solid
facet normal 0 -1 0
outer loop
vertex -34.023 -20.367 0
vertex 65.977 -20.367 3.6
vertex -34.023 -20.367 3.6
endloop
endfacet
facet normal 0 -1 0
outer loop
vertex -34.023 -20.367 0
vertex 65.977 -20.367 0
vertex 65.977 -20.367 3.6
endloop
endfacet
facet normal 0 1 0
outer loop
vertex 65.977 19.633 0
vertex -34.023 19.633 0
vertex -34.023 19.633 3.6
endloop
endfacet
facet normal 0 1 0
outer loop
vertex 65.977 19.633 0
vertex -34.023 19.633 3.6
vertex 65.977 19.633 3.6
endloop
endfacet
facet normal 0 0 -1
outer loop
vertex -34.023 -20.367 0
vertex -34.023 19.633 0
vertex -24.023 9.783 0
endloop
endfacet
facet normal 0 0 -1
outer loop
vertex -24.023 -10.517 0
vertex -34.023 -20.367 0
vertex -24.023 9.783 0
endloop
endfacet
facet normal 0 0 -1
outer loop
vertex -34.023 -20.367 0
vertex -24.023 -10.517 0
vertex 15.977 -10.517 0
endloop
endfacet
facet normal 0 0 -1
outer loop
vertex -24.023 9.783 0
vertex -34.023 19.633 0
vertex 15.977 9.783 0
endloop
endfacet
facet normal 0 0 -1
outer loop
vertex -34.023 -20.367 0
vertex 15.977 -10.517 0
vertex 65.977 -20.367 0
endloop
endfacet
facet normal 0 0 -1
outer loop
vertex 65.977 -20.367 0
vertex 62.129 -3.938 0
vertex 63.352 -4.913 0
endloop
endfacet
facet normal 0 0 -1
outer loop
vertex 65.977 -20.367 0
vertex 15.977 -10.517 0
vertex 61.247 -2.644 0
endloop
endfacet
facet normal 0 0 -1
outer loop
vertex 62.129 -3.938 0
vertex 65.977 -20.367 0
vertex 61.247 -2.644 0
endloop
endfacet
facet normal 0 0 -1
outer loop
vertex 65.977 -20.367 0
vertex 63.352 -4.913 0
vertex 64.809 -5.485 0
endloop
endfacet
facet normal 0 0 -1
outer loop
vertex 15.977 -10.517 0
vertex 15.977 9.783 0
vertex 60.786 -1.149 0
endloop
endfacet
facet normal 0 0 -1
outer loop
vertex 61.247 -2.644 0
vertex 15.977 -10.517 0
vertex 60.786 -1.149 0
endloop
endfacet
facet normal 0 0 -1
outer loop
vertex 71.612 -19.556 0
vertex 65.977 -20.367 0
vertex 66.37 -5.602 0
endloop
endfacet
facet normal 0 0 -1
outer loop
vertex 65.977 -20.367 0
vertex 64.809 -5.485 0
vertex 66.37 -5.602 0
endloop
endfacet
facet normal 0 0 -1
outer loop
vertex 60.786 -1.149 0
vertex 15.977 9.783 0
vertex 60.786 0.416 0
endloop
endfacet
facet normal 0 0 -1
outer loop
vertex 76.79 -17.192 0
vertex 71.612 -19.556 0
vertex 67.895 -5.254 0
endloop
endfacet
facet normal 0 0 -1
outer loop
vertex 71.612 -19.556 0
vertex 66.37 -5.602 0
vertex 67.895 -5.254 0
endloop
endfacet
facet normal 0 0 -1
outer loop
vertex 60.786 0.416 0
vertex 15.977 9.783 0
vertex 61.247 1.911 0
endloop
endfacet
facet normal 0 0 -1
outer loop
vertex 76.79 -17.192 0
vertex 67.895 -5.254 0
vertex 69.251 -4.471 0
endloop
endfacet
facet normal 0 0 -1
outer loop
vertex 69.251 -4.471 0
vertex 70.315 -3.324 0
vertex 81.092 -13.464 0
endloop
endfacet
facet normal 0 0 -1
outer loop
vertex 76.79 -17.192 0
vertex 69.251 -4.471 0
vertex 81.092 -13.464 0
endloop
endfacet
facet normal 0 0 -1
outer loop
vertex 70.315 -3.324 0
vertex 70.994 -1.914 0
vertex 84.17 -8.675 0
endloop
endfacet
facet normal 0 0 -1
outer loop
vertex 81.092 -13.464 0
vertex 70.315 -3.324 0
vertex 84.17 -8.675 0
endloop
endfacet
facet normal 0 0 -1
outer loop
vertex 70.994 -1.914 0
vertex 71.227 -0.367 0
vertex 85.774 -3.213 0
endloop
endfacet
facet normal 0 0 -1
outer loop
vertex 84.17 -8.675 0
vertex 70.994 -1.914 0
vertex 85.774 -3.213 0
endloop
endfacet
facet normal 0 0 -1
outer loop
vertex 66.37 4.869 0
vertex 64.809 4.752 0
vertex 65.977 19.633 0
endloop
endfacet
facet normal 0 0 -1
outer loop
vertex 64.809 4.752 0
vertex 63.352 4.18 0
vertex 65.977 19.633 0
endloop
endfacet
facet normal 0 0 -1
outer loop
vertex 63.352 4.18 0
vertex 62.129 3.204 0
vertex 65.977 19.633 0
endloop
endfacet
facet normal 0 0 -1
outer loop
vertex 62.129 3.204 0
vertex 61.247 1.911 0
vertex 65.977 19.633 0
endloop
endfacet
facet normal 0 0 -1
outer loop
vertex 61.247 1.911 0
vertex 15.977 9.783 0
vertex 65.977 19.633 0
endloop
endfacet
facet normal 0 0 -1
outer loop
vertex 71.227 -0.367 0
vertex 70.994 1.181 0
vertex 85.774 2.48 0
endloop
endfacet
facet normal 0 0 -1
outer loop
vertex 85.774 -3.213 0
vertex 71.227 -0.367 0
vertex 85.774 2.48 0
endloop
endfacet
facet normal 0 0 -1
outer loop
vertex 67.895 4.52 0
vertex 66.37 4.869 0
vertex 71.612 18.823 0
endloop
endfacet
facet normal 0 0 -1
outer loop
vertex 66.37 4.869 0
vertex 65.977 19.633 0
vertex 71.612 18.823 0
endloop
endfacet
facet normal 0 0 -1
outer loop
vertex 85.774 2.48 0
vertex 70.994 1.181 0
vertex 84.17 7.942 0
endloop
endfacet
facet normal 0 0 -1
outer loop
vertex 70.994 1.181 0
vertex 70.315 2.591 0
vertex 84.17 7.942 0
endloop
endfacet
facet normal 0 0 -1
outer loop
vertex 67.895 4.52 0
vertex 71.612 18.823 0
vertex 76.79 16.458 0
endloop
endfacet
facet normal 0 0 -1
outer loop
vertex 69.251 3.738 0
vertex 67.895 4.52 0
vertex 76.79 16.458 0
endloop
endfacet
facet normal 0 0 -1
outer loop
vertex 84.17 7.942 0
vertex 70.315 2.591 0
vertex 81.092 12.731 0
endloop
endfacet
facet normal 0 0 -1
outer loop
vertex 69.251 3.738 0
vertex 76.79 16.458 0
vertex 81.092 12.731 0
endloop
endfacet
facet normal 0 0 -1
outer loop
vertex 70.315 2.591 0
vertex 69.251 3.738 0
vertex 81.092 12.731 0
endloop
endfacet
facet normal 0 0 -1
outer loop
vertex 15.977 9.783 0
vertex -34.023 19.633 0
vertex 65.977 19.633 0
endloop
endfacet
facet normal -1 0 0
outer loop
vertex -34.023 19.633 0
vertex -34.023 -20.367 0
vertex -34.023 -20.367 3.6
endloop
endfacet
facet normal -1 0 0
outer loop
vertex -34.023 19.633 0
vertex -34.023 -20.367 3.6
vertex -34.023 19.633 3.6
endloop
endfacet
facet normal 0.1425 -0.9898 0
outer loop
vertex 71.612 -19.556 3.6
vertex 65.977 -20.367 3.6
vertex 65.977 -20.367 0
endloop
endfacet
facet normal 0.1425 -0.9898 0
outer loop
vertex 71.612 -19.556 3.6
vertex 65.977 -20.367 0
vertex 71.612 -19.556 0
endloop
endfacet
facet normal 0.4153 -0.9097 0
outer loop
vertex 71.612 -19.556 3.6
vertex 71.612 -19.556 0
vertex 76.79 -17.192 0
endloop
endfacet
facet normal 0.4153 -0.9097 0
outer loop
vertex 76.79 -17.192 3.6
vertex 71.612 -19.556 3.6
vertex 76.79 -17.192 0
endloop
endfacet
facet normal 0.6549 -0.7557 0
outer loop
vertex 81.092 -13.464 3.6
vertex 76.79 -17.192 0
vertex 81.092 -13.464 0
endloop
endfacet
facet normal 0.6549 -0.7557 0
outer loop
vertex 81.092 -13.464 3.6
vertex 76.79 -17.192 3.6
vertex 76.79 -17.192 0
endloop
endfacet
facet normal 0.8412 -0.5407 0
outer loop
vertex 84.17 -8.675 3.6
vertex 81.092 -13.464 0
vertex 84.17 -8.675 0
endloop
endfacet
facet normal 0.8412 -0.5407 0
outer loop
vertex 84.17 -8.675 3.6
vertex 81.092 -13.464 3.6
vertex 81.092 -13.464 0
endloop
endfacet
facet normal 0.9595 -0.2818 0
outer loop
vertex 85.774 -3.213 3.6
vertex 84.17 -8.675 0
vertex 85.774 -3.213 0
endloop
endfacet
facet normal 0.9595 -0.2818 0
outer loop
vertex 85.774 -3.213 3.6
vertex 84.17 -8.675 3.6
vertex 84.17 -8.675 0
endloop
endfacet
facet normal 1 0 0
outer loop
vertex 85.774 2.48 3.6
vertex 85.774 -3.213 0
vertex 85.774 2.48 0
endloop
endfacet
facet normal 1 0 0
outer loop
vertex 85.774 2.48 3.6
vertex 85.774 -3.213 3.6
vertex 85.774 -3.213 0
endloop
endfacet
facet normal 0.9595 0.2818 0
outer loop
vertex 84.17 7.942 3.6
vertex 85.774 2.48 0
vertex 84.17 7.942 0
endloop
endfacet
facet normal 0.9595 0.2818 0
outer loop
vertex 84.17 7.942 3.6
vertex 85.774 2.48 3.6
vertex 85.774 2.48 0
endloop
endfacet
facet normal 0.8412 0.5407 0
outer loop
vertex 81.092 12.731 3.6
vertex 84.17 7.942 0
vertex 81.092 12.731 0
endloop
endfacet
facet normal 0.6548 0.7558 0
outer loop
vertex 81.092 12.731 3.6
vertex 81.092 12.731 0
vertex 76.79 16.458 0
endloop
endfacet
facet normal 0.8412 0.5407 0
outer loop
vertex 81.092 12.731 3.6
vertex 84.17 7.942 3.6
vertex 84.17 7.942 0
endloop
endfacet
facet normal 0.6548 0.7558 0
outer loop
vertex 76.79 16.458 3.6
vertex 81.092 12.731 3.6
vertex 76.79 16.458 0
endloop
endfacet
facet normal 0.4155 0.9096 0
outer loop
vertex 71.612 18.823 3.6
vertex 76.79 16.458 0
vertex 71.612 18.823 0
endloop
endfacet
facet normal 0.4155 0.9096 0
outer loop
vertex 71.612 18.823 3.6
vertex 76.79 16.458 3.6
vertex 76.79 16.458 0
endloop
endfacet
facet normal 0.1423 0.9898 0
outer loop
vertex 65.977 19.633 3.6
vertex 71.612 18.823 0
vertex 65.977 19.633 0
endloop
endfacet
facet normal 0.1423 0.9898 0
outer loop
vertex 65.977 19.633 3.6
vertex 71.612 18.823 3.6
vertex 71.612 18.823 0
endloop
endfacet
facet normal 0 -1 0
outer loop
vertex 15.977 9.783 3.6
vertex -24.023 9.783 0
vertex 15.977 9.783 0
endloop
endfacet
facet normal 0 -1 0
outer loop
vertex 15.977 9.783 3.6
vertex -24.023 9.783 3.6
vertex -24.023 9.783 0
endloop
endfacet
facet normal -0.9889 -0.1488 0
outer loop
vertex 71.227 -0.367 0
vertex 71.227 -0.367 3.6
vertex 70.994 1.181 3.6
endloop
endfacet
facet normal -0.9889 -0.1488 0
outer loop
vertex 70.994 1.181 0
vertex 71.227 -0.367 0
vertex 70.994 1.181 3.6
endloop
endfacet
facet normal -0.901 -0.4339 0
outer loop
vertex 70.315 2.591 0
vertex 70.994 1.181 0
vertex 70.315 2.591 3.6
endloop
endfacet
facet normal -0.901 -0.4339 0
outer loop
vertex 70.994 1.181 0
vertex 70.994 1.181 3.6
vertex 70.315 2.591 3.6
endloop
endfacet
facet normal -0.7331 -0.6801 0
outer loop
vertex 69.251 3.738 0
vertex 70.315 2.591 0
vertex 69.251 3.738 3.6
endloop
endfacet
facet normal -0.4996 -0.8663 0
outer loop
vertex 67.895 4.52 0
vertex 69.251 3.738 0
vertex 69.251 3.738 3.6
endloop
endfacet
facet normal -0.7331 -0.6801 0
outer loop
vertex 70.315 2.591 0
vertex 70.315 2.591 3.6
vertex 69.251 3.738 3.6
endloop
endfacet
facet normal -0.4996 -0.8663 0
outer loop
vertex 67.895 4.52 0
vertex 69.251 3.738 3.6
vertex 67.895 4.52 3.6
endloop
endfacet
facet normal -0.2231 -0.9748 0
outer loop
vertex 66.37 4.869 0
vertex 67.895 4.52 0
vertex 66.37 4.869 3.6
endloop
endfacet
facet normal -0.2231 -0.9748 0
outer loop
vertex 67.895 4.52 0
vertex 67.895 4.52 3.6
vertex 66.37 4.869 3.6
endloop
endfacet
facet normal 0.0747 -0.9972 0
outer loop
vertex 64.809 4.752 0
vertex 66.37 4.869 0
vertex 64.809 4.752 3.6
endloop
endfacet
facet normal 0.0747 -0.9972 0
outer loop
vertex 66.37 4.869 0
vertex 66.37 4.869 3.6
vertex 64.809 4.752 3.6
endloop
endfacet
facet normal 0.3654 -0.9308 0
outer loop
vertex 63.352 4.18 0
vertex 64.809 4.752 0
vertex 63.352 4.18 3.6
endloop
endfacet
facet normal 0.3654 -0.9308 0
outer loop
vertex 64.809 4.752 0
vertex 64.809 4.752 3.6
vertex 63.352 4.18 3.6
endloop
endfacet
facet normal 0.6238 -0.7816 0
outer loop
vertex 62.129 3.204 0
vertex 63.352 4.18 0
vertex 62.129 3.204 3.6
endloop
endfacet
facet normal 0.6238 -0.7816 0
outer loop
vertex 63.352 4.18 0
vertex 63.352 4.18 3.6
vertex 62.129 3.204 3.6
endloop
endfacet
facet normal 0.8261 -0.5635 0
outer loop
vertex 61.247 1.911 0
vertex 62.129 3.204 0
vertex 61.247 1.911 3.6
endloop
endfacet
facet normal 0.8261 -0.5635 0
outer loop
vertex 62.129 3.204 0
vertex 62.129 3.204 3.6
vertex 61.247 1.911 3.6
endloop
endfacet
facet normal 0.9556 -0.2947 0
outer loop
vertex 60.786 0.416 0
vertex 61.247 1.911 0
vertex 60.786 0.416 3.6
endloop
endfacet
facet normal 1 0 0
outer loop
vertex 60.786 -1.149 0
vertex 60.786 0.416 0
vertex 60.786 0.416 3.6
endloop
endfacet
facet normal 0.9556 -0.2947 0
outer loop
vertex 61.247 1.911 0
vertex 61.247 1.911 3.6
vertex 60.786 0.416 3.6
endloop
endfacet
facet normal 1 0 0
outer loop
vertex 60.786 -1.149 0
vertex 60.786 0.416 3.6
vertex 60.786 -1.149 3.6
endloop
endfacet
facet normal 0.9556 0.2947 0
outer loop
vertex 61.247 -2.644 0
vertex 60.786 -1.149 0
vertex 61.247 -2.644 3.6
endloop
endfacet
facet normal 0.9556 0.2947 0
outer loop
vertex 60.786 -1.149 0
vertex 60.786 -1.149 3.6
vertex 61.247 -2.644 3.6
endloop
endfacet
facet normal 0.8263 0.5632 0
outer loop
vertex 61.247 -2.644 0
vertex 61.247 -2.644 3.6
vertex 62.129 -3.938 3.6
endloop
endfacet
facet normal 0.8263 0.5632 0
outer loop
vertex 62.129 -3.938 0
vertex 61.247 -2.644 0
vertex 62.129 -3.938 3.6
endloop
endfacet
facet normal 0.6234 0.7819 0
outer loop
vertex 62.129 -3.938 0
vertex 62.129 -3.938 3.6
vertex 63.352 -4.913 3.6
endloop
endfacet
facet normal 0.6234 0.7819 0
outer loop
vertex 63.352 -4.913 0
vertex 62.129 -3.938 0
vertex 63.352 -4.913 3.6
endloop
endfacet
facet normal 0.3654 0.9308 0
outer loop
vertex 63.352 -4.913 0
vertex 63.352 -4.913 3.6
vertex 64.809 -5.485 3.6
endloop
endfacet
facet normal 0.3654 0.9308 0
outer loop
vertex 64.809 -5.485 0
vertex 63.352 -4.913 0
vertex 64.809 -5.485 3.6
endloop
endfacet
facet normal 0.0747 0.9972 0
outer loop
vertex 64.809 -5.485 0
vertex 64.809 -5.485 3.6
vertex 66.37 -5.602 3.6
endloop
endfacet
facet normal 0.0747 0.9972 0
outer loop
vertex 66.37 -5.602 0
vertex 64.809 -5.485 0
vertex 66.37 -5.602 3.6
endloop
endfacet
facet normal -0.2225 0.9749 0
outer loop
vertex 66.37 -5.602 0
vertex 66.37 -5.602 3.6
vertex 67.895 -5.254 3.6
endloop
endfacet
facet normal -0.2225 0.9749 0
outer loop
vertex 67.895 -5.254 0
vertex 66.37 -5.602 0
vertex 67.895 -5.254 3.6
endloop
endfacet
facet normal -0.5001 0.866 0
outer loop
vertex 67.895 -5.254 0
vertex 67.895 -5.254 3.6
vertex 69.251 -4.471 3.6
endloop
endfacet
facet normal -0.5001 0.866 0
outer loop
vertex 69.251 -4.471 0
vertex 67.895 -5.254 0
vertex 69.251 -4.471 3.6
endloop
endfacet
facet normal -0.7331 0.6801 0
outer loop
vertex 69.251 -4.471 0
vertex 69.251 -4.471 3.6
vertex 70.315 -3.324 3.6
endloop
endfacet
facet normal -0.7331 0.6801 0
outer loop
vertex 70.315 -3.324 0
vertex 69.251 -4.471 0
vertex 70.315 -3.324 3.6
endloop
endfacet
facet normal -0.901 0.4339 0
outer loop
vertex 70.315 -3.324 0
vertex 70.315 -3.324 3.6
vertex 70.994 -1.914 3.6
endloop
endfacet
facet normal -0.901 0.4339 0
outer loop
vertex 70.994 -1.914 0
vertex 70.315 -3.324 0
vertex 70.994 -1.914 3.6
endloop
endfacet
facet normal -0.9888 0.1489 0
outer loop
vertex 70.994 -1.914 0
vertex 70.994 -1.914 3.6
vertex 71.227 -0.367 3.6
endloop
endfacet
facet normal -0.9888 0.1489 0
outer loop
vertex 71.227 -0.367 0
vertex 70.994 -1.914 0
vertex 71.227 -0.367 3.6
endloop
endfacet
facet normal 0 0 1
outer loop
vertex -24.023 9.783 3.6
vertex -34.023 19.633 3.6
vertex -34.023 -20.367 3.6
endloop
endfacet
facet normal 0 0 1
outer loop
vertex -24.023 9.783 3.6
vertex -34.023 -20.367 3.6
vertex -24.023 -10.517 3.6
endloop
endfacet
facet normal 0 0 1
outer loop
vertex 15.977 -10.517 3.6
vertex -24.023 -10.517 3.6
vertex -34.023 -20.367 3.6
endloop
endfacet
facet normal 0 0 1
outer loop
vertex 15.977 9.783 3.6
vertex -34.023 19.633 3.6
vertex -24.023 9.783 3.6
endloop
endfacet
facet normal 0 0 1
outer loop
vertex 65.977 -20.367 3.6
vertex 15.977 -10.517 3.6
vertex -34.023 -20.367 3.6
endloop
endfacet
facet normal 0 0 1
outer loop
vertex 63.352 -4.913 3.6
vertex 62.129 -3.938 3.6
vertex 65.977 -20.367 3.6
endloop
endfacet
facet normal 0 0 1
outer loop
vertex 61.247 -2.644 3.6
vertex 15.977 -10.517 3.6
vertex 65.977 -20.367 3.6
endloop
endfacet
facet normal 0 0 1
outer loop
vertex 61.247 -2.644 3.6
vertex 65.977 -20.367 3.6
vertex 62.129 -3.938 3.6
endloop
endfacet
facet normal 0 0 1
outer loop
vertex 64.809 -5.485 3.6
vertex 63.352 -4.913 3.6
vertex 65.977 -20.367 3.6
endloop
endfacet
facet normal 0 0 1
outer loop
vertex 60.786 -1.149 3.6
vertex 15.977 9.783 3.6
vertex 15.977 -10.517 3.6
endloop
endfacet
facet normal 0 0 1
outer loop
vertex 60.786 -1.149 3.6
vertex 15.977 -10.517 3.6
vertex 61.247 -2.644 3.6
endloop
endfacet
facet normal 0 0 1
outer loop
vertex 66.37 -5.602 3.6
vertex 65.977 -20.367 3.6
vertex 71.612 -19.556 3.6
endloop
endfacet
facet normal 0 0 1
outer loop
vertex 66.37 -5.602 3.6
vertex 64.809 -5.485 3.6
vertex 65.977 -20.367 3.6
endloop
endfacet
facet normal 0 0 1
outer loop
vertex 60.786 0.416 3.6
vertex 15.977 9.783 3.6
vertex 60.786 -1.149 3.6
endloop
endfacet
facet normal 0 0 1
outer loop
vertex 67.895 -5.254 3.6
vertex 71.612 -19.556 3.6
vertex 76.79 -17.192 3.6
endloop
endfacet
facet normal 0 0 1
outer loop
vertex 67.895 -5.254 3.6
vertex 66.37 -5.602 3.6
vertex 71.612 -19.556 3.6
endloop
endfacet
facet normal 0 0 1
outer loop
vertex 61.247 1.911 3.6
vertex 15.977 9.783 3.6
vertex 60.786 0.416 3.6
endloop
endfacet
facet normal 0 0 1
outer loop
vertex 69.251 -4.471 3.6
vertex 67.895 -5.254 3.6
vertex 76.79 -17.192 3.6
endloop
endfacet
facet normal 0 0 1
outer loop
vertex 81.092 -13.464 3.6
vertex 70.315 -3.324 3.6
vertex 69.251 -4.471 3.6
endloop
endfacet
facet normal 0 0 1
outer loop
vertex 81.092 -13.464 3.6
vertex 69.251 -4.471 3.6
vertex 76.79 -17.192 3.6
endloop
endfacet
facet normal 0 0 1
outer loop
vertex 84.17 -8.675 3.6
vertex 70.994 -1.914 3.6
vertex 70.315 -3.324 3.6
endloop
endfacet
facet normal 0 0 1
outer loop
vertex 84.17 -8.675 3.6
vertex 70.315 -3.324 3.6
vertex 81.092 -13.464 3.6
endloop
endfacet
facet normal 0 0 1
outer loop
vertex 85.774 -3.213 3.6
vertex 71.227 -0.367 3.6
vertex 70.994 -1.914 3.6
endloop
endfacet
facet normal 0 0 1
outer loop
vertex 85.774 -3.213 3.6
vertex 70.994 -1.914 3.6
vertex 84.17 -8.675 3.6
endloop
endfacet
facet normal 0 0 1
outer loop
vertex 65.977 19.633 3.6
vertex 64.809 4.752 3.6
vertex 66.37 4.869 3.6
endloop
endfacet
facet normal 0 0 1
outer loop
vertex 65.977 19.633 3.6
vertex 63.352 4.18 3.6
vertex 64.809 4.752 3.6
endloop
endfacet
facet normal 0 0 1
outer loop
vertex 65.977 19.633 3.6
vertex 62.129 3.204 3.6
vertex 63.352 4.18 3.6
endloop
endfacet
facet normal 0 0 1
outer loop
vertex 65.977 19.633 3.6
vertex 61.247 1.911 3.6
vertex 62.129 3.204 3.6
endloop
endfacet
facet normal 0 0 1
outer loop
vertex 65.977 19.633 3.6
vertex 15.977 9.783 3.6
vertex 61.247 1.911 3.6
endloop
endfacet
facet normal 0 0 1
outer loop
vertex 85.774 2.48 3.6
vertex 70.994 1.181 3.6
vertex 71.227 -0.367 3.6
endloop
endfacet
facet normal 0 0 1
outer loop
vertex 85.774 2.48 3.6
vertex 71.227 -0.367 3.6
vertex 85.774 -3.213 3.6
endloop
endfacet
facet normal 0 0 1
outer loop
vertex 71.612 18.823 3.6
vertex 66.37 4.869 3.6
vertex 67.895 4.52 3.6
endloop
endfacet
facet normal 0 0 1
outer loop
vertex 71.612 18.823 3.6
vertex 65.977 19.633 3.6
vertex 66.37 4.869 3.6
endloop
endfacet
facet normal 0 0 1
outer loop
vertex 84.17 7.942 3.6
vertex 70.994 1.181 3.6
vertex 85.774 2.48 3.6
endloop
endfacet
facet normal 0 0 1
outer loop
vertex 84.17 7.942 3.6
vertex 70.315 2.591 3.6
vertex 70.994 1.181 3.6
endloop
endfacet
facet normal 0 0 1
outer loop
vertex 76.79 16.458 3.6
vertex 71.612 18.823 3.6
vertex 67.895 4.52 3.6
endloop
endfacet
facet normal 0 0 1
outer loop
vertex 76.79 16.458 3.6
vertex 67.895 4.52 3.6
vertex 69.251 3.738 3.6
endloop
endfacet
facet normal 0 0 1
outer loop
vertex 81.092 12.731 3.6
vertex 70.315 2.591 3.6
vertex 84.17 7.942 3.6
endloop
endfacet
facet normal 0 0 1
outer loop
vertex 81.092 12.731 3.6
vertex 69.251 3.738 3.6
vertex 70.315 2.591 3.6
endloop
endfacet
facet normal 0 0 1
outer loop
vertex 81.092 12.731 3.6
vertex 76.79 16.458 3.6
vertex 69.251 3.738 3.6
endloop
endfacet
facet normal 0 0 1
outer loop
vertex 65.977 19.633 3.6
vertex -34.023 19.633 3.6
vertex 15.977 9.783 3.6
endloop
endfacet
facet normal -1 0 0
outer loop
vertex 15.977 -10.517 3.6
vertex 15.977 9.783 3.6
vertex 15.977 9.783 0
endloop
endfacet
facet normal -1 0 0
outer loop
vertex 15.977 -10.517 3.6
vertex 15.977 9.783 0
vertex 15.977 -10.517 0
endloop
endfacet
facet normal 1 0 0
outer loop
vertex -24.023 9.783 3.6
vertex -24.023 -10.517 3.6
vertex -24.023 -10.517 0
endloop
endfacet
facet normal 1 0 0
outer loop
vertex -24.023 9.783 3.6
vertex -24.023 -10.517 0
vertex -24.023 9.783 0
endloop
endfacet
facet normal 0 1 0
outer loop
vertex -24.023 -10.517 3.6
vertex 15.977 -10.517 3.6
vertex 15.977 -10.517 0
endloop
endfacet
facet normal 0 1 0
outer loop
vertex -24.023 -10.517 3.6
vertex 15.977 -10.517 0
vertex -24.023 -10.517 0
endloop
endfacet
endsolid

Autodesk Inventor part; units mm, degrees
ref_plane "YZ Plane" through (0, 0, 0) normal (1, 0, 0) x (0, 1, 0)
ref_plane "XZ Plane" through (0, 0, 0) normal (0, 1, 0) x (-1, 0, 0)
ref_plane "XY Plane" through (0, 0, 0) normal (0, 0, 1) x (1, 0, 0)
sketch "Sketch1" plane through (0, 0, 0) normal (0, 0, 1) x (1, 0, 0)
  line L0 (-34.0226, 19.6334) -> (65.9774, 19.6334)
  line L1 (65.9774, 19.6334) -> (65.9774, -20.3666)
  line L2 (65.9774, -20.3666) -> (-34.0226, -20.3666)
  line L3 (-34.0226, -20.3666) -> (-34.0226, 19.6334)
  point P0 (0, 0)
  dimension "d0" = 100
  dimension "d1" = 40
extrude "Extrusion1" add sketch "Sketch1" along normal blind 3.6
sketch "Sketch2" plane through (0, 0, 3.6) normal (0, 0, 1) x (1, 0, 0)
  line L0 (15.9774, -10.5166) -> (-24.0226, -10.5166)
  line L1 (-24.0226, -10.5166) -> (-24.0226, 9.7834)
  line L2 (-24.0226, 9.7834) -> (15.9774, 9.7834)
  line L3 (15.9774, 9.7834) -> (15.9774, -10.5166)
  line L4 (-34.0226, -20.3666) -> (65.9774, -20.3666) projected
  line L5 (65.9774, 19.6334) -> (-34.0226, 19.6334) projected
  line L6 (-34.0226, -20.3666) -> (-34.0226, 19.6334) projected
  point P0 (0, 0)
  dimension "d4" = 40
  dimension "d5" = 20.3
  dimension "d6" = 9.85
  dimension "d7" = 9.85
  dimension "d8" = 10
extrude "Extrusion2" cut sketch "Sketch2" against normal blind 4
sketch "Sketch3" plane through (0, 0, 3.6) normal (0, 0, 1) x (1, 0, 0)
  line L0 (65.9774, -20.3666) -> (65.9774, 19.6334) projected
  circle A0 centre (65.9774, -0.3666) radius 20
  point P0 (0, 0)
extrude "Extrusion3" add sketch "Sketch3" against normal blind 3.6
sketch "Sketch4" plane through (0, 0, 3.6) normal (0, 0, 1) x (1, 0, 0)
  arc A0 (65.9774, -20.3666) -> (65.9774, 19.6334) centre (65.9774, -0.3666) ccw projected
  circle A1 centre (65.9774, -0.3666) radius 5.25
  point P0 (0, 0)
  dimension "d13" = 10.5
extrude "Extrusion4" cut sketch "Sketch4" against normal blind 4
properties part number "plaat1"
